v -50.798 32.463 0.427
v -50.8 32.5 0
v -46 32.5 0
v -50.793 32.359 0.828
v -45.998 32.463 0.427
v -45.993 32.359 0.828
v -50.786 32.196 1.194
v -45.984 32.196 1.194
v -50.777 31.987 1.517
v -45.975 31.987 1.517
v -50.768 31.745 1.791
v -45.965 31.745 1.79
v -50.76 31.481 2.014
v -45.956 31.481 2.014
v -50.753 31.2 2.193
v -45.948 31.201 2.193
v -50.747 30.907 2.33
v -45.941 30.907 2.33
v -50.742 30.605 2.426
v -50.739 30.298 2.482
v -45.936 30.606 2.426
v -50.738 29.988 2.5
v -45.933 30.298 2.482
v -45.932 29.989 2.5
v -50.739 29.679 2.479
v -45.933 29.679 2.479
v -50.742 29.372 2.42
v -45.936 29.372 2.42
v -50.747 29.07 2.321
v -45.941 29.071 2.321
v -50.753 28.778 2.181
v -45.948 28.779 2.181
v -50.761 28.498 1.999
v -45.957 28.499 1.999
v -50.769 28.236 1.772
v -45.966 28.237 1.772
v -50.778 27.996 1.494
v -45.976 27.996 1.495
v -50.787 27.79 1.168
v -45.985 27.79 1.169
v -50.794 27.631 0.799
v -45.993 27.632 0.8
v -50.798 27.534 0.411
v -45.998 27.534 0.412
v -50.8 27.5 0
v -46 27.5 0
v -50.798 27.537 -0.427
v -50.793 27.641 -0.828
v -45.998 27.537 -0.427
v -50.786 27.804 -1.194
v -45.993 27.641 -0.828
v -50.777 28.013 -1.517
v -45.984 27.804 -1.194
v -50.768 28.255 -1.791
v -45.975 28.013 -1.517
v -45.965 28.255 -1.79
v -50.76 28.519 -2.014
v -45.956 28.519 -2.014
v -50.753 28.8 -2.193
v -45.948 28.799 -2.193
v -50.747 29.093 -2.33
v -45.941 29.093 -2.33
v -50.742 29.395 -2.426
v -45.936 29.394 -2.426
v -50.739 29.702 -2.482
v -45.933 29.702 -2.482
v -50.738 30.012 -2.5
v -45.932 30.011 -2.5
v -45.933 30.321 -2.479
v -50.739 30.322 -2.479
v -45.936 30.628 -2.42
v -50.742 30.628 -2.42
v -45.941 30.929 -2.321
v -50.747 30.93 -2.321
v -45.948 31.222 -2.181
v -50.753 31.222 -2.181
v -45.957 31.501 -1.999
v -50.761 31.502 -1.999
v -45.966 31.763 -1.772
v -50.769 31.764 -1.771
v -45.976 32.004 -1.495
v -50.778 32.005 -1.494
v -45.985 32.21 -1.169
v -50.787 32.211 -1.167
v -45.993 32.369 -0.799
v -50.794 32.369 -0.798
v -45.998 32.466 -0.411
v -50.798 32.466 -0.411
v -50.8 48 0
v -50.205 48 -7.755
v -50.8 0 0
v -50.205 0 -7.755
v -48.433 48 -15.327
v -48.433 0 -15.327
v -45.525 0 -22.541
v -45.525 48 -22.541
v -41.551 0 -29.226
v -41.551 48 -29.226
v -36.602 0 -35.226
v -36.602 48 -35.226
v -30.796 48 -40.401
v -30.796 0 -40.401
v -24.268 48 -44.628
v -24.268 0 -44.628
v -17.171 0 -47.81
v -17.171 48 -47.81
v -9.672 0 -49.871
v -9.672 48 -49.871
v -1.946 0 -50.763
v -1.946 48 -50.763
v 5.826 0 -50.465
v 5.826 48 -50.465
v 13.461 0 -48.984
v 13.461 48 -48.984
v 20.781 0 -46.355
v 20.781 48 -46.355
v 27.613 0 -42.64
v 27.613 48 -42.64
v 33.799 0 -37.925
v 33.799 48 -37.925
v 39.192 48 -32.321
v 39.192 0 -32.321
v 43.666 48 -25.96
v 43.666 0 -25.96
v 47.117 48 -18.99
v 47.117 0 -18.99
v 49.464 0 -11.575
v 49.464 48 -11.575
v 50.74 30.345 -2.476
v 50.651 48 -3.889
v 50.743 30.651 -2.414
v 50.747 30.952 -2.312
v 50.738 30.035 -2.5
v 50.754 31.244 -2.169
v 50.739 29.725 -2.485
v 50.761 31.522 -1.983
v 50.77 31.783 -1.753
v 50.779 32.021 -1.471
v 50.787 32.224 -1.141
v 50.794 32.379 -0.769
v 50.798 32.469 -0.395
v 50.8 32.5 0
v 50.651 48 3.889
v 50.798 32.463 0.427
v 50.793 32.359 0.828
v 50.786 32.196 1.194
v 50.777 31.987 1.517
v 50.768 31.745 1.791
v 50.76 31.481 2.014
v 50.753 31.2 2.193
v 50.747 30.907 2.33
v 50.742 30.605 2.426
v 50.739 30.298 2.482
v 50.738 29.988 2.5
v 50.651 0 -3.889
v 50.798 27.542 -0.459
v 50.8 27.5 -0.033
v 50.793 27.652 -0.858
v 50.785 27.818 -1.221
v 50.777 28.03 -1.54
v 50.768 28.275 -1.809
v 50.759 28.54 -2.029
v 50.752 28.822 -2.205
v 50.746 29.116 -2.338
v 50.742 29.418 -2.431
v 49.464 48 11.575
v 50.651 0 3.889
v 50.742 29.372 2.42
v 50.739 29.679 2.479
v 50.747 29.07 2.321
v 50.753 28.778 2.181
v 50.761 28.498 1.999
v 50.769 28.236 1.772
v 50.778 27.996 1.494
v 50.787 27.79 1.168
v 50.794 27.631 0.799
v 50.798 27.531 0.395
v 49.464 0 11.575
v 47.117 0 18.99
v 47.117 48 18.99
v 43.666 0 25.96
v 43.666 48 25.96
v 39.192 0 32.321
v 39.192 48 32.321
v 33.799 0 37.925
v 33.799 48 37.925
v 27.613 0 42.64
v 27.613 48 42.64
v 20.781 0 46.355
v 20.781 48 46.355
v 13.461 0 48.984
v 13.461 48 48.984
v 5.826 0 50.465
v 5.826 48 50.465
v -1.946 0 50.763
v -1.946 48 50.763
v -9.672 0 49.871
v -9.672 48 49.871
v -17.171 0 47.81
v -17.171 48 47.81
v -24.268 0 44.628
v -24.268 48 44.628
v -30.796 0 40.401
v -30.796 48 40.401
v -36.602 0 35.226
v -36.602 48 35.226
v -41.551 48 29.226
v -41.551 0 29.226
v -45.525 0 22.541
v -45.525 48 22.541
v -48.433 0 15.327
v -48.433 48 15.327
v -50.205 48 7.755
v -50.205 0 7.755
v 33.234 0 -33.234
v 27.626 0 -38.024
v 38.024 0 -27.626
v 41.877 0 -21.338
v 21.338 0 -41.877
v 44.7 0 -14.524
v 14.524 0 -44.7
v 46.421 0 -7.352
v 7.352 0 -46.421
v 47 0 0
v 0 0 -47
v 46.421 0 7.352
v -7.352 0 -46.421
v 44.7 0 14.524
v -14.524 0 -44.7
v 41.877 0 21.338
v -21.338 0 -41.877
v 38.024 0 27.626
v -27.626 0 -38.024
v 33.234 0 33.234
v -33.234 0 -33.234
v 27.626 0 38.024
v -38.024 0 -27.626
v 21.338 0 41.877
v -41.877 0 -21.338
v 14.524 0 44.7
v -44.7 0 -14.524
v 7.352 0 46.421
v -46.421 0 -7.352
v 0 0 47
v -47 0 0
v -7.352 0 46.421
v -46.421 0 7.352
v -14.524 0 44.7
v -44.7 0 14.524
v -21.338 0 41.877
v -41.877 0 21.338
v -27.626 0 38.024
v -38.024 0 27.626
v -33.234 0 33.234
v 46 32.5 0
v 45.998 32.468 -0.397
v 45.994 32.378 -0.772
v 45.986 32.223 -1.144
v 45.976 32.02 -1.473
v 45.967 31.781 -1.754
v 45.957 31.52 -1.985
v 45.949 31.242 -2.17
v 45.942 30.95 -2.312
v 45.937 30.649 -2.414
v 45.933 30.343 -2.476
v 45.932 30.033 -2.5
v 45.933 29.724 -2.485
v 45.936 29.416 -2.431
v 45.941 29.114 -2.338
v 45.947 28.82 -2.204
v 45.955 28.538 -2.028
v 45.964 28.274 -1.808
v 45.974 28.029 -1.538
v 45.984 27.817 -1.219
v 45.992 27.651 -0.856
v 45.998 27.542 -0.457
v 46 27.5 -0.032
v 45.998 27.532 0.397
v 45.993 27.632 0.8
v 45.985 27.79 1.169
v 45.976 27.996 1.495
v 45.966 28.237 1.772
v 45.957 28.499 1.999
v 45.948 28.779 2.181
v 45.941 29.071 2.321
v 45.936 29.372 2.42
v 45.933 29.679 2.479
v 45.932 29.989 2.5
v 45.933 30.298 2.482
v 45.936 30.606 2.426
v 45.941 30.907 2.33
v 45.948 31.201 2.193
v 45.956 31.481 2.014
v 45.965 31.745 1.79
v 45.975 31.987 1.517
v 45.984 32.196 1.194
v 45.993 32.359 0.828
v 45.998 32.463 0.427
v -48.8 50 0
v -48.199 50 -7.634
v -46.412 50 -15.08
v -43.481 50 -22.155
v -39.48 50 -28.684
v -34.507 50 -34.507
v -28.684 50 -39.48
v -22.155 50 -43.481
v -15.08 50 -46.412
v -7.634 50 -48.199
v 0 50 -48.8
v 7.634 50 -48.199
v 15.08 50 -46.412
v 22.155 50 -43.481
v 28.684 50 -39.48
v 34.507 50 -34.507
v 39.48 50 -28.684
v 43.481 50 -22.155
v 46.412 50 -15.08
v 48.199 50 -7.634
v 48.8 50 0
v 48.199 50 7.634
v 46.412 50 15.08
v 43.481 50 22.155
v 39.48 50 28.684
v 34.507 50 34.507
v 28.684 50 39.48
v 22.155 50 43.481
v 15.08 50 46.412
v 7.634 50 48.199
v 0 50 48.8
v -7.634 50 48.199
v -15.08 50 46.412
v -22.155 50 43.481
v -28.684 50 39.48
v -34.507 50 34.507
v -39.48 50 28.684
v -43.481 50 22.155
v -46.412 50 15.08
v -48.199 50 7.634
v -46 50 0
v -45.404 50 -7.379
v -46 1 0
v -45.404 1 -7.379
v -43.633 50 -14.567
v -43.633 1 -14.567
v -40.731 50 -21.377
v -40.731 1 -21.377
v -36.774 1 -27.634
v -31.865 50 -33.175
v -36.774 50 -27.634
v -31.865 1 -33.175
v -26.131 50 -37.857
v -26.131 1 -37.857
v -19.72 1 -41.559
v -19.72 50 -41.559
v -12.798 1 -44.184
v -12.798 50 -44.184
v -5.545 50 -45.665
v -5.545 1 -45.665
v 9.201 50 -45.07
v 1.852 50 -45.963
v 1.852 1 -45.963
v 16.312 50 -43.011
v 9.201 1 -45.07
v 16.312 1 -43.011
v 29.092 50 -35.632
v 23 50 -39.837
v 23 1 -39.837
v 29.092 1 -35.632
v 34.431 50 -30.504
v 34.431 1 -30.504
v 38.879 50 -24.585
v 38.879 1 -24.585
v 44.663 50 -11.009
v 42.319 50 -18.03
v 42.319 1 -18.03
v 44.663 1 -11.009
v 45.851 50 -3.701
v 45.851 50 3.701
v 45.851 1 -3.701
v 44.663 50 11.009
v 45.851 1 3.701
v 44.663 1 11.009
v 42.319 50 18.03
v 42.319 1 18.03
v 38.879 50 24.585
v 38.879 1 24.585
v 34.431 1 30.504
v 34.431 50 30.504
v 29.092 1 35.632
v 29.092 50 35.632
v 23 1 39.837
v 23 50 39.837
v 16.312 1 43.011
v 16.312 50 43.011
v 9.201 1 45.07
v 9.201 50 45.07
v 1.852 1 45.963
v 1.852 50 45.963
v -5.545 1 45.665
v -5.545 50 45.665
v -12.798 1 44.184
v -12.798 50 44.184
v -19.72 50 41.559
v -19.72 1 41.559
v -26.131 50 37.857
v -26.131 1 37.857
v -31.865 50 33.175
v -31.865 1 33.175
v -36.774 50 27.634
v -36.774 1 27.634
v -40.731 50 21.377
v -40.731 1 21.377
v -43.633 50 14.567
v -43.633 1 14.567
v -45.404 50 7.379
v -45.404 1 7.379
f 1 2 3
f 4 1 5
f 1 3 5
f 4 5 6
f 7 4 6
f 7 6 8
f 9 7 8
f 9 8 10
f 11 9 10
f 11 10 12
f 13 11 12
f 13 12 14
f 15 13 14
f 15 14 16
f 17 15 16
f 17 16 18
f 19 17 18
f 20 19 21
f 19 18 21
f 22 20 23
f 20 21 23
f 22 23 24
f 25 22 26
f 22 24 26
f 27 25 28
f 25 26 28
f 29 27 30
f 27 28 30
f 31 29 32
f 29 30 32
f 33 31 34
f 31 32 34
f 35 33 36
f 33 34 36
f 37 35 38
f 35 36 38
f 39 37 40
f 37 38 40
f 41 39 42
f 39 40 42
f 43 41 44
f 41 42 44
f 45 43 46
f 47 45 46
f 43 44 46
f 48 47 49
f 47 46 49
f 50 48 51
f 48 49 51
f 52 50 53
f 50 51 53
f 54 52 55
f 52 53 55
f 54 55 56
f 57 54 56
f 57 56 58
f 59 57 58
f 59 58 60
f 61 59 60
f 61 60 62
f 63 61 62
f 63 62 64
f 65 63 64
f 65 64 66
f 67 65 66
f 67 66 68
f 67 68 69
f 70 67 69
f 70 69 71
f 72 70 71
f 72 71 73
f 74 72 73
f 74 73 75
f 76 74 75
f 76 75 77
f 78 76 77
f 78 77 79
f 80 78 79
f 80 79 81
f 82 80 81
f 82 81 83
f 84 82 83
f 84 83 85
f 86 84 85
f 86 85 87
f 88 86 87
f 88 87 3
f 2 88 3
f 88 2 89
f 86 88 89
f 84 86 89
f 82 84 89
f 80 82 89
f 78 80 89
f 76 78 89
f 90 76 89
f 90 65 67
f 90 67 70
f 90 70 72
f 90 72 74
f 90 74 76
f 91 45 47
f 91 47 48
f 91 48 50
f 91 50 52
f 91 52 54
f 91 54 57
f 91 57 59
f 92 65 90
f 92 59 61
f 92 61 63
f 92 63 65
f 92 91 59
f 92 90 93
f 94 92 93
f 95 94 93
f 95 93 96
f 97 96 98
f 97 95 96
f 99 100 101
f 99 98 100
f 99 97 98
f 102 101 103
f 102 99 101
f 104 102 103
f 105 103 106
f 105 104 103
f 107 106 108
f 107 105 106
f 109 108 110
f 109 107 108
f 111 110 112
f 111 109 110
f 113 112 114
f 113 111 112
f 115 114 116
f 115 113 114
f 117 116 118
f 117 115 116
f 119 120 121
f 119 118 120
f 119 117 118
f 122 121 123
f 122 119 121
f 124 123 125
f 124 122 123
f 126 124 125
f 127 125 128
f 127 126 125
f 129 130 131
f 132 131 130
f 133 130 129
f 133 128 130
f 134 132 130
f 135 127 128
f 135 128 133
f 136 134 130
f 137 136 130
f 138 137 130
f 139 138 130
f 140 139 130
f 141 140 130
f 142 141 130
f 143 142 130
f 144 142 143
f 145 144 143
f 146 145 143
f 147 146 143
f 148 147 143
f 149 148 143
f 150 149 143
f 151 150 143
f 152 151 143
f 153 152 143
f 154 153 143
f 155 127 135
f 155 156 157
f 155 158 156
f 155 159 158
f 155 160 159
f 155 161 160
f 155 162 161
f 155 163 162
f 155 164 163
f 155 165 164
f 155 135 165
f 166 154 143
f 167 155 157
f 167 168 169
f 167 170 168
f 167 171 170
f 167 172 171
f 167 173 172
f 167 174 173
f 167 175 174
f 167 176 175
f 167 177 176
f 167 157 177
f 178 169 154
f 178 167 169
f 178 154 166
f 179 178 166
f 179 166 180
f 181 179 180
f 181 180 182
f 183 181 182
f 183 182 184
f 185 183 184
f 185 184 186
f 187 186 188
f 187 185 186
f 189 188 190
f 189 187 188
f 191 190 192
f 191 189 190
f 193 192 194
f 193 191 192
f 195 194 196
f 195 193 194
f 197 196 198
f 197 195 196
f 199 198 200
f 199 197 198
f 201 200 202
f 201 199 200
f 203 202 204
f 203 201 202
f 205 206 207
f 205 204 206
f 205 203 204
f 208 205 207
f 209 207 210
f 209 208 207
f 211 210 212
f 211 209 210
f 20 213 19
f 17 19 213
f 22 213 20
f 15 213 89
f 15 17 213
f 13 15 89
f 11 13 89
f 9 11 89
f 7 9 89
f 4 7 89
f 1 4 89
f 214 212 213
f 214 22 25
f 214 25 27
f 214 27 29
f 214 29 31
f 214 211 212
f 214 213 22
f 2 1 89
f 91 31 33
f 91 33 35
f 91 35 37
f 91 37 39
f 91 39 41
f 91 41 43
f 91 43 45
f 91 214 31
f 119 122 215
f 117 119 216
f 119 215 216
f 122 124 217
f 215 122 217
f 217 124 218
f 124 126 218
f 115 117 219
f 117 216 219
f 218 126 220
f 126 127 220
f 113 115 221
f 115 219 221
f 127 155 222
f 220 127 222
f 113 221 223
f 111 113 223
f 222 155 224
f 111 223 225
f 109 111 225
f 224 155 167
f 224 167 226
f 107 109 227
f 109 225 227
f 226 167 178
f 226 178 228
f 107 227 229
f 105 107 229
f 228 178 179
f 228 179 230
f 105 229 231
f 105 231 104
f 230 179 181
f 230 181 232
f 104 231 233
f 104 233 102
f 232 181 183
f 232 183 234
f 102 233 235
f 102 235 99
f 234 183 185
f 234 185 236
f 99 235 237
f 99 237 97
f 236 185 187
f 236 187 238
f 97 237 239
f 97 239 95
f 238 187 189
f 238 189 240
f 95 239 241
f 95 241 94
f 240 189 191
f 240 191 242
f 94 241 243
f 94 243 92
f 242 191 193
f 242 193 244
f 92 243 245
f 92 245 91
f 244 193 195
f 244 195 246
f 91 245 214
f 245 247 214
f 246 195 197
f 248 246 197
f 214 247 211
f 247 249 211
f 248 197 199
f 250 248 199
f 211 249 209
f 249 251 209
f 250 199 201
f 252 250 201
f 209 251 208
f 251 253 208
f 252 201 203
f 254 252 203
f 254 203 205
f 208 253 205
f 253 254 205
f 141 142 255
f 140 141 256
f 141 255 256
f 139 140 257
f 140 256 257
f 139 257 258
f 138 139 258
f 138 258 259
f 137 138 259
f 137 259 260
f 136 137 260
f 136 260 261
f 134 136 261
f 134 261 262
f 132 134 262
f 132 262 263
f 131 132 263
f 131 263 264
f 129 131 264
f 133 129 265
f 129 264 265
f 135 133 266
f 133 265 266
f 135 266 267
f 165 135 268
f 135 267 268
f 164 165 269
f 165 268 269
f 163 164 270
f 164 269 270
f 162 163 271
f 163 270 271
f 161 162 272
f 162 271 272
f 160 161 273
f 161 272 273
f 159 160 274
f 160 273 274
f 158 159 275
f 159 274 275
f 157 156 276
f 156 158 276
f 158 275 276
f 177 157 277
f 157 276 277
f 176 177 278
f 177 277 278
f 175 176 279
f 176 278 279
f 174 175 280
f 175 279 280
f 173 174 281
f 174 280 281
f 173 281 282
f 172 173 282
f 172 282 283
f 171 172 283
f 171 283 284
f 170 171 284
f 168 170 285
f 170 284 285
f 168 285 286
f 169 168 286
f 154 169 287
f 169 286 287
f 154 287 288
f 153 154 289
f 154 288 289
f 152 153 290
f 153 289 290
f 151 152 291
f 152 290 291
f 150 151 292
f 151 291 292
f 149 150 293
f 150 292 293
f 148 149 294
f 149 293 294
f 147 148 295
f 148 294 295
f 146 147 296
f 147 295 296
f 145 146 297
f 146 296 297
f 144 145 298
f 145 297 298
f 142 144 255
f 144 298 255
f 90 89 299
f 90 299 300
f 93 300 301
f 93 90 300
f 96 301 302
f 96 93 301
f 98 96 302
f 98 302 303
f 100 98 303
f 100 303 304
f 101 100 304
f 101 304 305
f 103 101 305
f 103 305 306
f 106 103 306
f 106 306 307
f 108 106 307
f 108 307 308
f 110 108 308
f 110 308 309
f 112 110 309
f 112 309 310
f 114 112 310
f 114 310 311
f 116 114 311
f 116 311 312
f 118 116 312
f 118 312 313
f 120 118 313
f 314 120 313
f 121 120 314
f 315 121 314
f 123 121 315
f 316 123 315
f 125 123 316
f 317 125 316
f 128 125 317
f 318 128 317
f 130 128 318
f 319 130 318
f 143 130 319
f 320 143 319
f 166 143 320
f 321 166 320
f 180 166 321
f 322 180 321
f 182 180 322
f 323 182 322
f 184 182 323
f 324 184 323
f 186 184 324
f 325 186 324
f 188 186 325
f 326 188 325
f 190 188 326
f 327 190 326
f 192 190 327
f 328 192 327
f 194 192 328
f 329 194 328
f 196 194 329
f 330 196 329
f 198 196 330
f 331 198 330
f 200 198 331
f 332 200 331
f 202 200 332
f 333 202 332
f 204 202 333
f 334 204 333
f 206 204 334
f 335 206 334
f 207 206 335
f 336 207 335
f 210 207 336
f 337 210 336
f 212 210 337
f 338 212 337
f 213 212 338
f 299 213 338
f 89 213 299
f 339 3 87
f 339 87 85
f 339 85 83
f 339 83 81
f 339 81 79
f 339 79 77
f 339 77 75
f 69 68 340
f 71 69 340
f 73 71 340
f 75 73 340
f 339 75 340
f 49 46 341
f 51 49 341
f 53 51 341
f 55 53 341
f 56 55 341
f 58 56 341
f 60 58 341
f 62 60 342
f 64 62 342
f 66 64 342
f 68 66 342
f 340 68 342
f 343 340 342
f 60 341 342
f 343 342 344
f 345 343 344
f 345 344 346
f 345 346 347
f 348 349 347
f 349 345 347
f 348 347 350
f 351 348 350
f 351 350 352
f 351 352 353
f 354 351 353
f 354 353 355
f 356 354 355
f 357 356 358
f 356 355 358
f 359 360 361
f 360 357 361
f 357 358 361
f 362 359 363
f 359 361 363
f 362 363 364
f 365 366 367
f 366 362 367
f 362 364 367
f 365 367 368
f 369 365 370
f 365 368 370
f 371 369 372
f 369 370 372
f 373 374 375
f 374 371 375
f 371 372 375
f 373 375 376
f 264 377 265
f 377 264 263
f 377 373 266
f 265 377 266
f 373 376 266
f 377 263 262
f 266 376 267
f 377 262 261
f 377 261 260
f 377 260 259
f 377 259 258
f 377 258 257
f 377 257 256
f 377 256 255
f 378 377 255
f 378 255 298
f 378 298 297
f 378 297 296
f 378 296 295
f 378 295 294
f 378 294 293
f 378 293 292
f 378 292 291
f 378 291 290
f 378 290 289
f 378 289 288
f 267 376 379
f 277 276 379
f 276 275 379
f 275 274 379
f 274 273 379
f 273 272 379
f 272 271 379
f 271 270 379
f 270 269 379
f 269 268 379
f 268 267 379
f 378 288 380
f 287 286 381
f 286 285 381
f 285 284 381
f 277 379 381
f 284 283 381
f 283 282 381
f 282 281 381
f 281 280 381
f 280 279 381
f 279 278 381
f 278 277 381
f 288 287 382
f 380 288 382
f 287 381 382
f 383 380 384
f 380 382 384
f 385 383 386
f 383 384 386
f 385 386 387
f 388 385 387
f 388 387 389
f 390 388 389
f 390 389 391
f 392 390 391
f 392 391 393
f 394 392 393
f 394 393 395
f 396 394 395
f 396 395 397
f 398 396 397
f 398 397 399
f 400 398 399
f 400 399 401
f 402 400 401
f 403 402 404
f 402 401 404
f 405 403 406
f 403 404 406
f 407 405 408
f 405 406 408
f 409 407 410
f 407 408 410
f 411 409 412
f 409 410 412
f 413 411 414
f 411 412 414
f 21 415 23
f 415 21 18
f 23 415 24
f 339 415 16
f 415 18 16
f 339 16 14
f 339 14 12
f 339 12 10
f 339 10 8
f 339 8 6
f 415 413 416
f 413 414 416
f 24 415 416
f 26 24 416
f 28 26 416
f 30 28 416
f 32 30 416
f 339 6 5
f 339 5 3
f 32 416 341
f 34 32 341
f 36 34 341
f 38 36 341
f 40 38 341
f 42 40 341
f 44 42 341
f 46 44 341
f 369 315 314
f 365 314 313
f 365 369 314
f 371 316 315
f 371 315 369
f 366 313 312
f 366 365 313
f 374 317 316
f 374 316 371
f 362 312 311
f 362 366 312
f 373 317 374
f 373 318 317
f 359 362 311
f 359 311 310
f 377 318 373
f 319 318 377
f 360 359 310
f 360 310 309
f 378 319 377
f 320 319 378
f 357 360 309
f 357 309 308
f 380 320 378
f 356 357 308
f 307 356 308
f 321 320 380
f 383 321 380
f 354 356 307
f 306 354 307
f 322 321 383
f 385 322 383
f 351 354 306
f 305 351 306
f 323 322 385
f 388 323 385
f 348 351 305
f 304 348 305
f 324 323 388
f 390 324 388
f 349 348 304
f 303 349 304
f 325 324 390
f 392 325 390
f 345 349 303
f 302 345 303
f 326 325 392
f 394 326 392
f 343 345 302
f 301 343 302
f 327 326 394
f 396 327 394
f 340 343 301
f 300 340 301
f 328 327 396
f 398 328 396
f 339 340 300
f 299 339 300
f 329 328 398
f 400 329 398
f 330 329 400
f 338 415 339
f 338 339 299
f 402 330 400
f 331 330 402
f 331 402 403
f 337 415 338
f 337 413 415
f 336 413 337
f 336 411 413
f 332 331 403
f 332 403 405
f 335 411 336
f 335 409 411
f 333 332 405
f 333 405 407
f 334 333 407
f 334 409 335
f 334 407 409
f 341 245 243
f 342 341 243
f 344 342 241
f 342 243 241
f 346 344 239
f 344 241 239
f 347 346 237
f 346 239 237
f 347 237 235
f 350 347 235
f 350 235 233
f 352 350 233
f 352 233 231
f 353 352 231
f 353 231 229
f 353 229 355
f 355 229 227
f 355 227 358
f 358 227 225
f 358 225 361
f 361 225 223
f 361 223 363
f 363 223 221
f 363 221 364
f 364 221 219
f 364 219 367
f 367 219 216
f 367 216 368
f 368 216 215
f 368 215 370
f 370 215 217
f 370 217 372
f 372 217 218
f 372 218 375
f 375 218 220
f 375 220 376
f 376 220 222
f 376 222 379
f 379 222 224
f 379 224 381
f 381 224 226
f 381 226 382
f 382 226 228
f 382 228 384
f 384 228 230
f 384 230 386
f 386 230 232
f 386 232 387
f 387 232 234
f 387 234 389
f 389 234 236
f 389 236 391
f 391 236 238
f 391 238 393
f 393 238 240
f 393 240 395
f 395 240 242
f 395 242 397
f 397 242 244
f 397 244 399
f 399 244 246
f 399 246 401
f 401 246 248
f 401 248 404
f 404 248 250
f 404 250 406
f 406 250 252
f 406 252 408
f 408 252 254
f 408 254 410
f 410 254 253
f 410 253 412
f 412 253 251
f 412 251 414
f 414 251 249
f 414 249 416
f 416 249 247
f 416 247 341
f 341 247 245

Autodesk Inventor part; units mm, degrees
ref_plane "YZ Plane" through (0, 0, 0) normal (1, 0, 0) x (0, 1, 0)
ref_plane "XZ Plane" through (0, 0, 0) normal (0, 1, 0) x (-1, 0, 0)
ref_plane "XY Plane" through (0, 0, 0) normal (0, 0, 1) x (1, 0, 0)
sketch "Sketch1" plane through (0, 0, 0) normal (0, 1, 0) x (-1, 0, 0)
  circle A0 centre (0, 0) radius 46
  circle A1 centre (0, 0) radius 50.8
  dimension "d0" = 92
  dimension "d1" = 101.6
extrude "Extrusion1" add sketch "Sketch1" along normal blind 50
chamfer "Chamfer1" distance 2 angle 45 1 edges at (50.8, 50, 0)
chamfer "Chamfer2" distance 1 angle 45 1 edges at (46, 0, 0)
sketch "Sketch2" plane through (0, 0, 0) normal (1, 0, 0) x (0, 1, 0)
  circle A0 centre (30, 0) radius 2.5
  line L0 (50, 46) -> (50, -46) projected
  point P0 (0, 0)
  dimension "d10" = 5
  dimension "d11" = 20
extrude "Extrusion2" cut sketch "Sketch2" along normal through all both and the other way through all
properties part number "HubSparHole90"
